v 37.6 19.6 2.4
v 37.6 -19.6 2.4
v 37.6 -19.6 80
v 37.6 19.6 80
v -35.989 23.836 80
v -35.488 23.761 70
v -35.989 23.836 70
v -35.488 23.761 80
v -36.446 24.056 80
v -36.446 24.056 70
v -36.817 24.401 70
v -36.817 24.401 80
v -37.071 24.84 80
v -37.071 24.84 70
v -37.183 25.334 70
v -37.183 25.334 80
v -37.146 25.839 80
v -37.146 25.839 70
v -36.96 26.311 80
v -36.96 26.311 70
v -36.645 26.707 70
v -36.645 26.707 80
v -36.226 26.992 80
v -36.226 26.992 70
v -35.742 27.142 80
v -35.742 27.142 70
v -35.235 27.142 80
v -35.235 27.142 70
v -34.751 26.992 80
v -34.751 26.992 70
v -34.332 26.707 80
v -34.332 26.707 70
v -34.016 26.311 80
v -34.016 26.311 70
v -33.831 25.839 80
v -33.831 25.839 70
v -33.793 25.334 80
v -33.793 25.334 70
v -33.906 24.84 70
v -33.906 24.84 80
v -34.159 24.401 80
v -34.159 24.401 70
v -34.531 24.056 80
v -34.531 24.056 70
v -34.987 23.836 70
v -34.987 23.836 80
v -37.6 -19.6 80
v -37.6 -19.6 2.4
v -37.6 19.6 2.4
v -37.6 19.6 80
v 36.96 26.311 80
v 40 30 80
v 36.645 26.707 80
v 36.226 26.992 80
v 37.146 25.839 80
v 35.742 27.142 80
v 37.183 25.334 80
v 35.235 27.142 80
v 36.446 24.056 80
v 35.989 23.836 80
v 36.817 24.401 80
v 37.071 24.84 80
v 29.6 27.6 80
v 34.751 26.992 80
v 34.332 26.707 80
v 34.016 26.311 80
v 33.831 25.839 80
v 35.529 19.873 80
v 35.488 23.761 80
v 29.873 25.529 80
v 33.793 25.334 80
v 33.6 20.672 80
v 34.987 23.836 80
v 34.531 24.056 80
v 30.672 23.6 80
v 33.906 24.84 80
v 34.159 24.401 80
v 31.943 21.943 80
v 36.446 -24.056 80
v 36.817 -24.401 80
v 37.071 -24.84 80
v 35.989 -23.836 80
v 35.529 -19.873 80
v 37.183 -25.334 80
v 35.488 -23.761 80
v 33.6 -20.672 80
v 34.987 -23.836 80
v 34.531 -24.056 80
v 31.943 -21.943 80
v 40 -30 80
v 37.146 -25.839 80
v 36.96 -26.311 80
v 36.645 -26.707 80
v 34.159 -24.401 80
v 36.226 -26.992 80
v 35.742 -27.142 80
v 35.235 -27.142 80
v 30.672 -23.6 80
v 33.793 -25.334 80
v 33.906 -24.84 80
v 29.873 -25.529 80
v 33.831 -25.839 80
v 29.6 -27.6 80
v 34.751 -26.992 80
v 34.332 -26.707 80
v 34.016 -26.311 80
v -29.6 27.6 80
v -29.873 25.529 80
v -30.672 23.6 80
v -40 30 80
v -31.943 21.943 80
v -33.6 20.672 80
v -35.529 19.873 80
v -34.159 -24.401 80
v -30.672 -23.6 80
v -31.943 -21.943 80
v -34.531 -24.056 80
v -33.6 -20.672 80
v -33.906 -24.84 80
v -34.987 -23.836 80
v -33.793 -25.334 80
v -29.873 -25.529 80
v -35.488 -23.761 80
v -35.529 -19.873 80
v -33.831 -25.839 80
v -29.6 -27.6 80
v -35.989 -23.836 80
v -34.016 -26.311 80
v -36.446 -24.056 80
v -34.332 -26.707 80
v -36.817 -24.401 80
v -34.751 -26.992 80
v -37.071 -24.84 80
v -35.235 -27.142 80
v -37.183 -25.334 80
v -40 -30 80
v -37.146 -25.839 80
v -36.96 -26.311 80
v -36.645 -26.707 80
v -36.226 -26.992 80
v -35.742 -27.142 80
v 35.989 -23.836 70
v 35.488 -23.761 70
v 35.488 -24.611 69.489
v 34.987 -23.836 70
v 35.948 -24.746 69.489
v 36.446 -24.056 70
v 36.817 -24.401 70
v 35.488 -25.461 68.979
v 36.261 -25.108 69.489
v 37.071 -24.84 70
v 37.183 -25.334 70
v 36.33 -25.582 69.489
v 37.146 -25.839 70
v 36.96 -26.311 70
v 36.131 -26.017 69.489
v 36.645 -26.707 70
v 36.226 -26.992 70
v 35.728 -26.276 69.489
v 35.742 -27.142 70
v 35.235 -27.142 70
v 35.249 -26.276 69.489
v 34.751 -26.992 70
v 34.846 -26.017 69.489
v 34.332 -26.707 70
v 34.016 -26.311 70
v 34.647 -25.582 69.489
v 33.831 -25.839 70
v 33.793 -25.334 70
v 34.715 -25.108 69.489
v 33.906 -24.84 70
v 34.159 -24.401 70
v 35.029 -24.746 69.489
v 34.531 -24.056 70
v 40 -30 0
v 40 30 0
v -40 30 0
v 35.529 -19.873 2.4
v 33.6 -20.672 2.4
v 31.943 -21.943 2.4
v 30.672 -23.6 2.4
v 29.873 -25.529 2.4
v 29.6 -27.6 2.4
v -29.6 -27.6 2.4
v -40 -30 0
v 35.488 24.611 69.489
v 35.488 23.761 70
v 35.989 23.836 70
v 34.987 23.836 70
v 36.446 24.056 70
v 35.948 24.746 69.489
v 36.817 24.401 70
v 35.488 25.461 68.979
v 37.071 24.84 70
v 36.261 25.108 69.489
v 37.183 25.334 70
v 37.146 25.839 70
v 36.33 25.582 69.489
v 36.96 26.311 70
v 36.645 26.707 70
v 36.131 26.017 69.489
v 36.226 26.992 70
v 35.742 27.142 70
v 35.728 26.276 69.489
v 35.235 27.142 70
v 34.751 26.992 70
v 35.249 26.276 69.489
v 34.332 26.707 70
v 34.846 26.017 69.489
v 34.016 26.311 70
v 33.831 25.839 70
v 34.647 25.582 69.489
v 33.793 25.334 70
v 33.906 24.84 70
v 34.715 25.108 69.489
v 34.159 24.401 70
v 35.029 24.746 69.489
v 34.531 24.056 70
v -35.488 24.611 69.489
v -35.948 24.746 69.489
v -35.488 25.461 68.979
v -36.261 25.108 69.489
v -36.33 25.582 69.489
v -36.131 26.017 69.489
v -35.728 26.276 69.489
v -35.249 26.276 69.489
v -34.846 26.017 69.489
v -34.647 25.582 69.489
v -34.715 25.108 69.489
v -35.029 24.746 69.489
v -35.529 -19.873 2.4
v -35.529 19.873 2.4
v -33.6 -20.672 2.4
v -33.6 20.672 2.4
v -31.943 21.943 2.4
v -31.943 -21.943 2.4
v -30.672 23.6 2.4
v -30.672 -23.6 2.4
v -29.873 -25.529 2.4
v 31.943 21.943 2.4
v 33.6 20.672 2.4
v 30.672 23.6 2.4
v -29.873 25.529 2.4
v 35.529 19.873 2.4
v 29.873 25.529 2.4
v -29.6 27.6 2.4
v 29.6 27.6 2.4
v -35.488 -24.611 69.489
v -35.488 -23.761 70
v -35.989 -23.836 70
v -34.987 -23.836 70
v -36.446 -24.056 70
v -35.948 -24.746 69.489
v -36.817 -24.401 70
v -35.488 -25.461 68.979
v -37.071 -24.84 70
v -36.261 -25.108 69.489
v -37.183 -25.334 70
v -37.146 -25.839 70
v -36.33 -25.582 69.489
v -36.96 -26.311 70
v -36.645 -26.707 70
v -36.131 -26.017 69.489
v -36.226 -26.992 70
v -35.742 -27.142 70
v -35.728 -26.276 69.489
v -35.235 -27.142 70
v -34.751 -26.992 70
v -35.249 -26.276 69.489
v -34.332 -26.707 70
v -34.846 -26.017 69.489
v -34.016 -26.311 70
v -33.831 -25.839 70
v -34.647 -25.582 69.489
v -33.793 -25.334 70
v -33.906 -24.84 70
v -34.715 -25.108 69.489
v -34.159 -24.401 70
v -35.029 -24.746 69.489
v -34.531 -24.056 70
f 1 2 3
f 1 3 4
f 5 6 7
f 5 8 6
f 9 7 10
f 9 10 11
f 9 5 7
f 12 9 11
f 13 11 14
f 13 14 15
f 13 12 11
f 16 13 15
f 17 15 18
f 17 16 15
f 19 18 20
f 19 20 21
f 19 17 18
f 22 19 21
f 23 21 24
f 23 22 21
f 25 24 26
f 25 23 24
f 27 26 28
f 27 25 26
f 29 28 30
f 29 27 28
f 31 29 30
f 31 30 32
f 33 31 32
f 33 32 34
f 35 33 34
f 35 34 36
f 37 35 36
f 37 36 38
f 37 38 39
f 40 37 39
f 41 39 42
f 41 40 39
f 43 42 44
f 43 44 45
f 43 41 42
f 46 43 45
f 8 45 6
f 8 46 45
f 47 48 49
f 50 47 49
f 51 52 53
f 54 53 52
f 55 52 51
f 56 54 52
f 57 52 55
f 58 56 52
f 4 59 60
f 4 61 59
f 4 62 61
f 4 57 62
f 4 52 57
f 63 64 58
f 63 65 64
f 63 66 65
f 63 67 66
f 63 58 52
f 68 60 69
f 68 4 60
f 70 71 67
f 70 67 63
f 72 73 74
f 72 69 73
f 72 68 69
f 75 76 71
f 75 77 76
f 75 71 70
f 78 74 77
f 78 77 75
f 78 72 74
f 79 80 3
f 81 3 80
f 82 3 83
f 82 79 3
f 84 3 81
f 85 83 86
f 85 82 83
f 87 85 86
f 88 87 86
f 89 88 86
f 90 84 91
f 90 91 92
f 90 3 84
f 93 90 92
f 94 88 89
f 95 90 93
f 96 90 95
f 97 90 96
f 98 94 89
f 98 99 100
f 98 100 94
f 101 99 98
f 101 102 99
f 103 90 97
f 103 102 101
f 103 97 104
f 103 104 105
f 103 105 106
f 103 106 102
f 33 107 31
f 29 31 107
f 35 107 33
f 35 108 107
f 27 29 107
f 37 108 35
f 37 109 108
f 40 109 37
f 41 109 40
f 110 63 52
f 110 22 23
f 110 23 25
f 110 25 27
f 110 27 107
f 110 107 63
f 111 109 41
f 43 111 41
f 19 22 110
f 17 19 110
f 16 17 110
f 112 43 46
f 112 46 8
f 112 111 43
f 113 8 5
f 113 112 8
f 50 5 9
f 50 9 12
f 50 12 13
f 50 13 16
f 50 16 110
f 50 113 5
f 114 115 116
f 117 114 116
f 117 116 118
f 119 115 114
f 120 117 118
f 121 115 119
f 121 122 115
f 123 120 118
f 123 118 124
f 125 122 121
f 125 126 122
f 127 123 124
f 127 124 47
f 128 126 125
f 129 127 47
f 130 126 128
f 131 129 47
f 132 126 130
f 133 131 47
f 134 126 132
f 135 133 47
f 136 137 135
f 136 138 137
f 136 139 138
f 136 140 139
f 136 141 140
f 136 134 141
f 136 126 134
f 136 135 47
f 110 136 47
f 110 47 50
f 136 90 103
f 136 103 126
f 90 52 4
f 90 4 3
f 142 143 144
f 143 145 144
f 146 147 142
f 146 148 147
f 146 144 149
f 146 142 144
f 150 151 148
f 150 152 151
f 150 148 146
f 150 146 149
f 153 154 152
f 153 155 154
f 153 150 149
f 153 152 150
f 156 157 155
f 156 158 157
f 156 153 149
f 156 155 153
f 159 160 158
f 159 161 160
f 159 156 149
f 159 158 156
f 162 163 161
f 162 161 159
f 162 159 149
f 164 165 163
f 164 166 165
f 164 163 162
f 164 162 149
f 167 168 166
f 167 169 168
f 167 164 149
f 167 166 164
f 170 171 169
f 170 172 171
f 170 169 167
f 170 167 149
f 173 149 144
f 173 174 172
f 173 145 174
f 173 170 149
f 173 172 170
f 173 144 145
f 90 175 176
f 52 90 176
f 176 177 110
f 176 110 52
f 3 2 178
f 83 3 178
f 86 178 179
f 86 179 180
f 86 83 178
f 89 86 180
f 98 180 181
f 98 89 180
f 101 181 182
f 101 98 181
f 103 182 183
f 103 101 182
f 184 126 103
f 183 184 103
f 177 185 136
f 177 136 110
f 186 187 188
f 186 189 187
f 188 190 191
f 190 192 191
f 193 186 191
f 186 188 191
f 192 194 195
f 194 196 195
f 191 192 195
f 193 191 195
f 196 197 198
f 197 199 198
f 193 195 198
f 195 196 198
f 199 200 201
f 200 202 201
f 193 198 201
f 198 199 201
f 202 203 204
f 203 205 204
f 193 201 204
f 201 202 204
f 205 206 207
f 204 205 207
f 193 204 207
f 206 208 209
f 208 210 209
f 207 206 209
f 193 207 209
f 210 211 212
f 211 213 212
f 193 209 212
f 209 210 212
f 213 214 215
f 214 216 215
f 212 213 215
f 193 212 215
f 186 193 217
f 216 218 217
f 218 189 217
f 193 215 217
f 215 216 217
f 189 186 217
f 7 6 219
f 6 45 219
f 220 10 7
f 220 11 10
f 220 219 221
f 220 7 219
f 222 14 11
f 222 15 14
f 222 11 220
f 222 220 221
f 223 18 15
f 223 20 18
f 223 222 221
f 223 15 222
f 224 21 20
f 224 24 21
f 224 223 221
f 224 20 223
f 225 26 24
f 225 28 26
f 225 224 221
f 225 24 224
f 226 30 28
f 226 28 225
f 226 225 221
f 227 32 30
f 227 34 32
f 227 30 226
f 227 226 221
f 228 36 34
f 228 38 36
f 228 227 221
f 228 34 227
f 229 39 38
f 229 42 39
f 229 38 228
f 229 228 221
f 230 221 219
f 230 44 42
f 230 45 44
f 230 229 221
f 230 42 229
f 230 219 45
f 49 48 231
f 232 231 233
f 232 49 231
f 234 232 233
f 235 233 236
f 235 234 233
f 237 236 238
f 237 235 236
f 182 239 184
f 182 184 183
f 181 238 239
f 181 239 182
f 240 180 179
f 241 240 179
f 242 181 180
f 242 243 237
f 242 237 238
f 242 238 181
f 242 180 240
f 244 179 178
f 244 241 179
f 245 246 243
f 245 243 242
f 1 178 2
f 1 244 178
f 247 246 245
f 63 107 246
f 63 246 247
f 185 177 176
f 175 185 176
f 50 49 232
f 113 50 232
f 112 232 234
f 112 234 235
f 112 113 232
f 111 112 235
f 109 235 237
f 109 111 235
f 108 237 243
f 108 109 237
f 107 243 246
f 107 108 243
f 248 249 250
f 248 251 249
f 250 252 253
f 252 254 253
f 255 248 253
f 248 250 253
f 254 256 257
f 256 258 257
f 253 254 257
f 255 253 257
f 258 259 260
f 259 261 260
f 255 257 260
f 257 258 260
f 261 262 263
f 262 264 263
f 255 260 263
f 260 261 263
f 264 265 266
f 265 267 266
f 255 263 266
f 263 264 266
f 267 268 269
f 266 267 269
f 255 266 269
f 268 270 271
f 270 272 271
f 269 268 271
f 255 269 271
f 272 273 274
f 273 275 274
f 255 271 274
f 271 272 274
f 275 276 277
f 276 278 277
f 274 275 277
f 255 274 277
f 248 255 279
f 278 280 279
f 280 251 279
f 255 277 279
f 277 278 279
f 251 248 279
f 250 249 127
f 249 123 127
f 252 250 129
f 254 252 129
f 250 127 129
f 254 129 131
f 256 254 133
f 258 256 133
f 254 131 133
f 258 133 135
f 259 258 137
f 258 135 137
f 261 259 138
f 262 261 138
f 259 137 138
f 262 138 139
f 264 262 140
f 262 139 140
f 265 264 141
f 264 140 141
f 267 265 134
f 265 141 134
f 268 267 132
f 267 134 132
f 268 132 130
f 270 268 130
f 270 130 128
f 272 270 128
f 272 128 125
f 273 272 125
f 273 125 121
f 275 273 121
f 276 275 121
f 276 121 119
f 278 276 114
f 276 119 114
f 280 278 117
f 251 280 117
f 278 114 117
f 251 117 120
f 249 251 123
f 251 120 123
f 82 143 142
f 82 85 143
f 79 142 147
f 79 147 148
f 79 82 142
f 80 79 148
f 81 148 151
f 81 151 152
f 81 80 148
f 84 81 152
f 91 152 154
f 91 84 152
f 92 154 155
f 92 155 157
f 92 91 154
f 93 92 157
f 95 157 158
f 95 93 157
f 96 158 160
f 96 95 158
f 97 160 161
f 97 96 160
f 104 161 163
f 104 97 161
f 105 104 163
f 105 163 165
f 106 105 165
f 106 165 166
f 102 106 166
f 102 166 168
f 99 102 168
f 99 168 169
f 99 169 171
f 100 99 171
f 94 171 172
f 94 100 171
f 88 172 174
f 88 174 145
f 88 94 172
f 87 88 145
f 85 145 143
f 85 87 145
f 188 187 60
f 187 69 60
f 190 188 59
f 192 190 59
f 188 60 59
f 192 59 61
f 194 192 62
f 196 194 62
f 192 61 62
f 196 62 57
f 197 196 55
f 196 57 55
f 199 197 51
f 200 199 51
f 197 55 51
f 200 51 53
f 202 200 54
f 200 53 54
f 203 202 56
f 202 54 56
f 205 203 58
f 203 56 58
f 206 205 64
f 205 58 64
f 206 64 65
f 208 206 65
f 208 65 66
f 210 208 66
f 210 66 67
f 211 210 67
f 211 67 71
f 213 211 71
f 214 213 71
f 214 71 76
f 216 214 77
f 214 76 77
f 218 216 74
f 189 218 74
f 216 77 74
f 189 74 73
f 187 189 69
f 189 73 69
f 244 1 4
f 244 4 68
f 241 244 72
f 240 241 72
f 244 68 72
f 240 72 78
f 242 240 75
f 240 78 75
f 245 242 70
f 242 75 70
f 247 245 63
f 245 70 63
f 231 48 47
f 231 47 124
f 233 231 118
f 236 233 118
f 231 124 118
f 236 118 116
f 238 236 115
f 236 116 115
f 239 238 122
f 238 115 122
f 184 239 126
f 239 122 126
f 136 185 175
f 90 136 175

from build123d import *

# Parameters (mm, degrees)
ESQUISSE1_W                                = 80
ESQUISSE1_H                                = 60
BOSS_EXTRU_1_DEPTH                         = 80
COQUE1_T                                   = -2.4
BOSS_EXTRU_2_REACH                         = 96.34
SYM_TRIE1_AT_THE_SECOND_PLANE_COPY_1_REACH = 96.34


with BuildPart() as part:
    # Esquisse1 → Boss.-Extru.1 (new body)
    with BuildSketch(Plane.XY):
        Rectangle(ESQUISSE1_W, ESQUISSE1_H)
    extrude(amount=BOSS_EXTRU_1_DEPTH)

    # Coque1
    coque1_openings = [part.faces().sort_by_distance(p)[0] for p in [
        (0, 0, 80),
    ]]
    offset(amount=COQUE1_T, openings=coque1_openings, kind=Kind.INTERSECTION)

    # Esquisse2 → Boss.-Extru.2 (add, up to next)
    with BuildSketch(Plane.XY.offset(80), mode=Mode.PRIVATE) as boss_extru_2_sk1:
        with BuildLine():
            Line((-37.6, 27.6), (-37.6, 19.6))
            ThreePointArc((-37.6, 19.6), (-31.943145751, 21.943145751), (-29.6, 27.6))
            Line((-29.6, 27.6), (-37.6, 27.6))
        make_face()
    boss_extru_2_tool1 = extrude(boss_extru_2_sk1.sketch, amount=-BOSS_EXTRU_2_REACH, mode=Mode.PRIVATE) - part.part
    boss_extru_2 = boss_extru_2_tool1.solids().sort_by_distance((-34.204695, 24.204695, 80))[0]
    add(boss_extru_2)

    # Esquisse4 → Dégagement M31 (revolve, cut)
    with BuildSketch(Plane(origin=(-35.488231032, 25.460651403, 80), x_dir=(0, -1, 0), z_dir=(1, 0, 0))):
        Polygon((0, 0), (0, 11.021463052), (1.7, 10), (1.7, 0), align=None)
    d_gagement_m31 = revolve(axis=Axis((-35.488231032, 25.460651403, 86.35), (0, 0, -1)), mode=Mode.SUBTRACT)

    # Symétrie1: Boss.-Extru.2, Dégagement M31 across plane
    add(boss_extru_2.mirror(Plane(origin=(0, 0, 0), x_dir=(0, 0, 1), z_dir=(1, 0, 0))))
    add(d_gagement_m31.mirror(Plane(origin=(0, 0, 0), x_dir=(0, 0, 1), z_dir=(1, 0, 0))), mode=Mode.SUBTRACT)

    # Symétrie1 at the second plane: Boss.-Extru.2, Dégagement M31 across plane
    add(boss_extru_2.mirror(Plane.ZX))
    add(d_gagement_m31.mirror(Plane.ZX), mode=Mode.SUBTRACT)

    # Symétrie1 at the second plane copy 1 ske → Symétrie1 at the second plane copy 1 (add, up to next)
    with BuildSketch(Plane(origin=(0, 0, 80), x_dir=(-1, 0, 0), z_dir=(0, 0, 1)), mode=Mode.PRIVATE) as sym_trie1_at_the_second_plane_copy_1_sk1:
        with BuildLine():
            Line((-37.6, 27.6), (-37.6, 19.6))
            ThreePointArc((-37.6, 19.6), (-31.943145751, 21.943145751), (-29.6, 27.6))
            Line((-29.6, 27.6), (-37.6, 27.6))
        make_face()
    sym_trie1_at_the_second_plane_copy_1_tool1 = extrude(sym_trie1_at_the_second_plane_copy_1_sk1.sketch, amount=-SYM_TRIE1_AT_THE_SECOND_PLANE_COPY_1_REACH, mode=Mode.PRIVATE) - part.part
    add(sym_trie1_at_the_second_plane_copy_1_tool1.solids().sort_by_distance((34.204695, -24.204695, 80))[0])

    # Symétrie1 at the second plane copy 2 ske → Symétrie1 at the second plane copy 2 (revolve, cut)
    with BuildSketch(Plane(origin=(35.488231032, -25.460651403, 80), x_dir=(0, 1, 0), z_dir=(-1, 0, 0))):
        Polygon((0, 0), (0, 11.021463052), (1.7, 10), (1.7, 0), align=None)
    revolve(axis=Axis((35.488231032, -25.460651403, 86.35), (0, 0, -1)), mode=Mode.SUBTRACT)


solid = part.part
